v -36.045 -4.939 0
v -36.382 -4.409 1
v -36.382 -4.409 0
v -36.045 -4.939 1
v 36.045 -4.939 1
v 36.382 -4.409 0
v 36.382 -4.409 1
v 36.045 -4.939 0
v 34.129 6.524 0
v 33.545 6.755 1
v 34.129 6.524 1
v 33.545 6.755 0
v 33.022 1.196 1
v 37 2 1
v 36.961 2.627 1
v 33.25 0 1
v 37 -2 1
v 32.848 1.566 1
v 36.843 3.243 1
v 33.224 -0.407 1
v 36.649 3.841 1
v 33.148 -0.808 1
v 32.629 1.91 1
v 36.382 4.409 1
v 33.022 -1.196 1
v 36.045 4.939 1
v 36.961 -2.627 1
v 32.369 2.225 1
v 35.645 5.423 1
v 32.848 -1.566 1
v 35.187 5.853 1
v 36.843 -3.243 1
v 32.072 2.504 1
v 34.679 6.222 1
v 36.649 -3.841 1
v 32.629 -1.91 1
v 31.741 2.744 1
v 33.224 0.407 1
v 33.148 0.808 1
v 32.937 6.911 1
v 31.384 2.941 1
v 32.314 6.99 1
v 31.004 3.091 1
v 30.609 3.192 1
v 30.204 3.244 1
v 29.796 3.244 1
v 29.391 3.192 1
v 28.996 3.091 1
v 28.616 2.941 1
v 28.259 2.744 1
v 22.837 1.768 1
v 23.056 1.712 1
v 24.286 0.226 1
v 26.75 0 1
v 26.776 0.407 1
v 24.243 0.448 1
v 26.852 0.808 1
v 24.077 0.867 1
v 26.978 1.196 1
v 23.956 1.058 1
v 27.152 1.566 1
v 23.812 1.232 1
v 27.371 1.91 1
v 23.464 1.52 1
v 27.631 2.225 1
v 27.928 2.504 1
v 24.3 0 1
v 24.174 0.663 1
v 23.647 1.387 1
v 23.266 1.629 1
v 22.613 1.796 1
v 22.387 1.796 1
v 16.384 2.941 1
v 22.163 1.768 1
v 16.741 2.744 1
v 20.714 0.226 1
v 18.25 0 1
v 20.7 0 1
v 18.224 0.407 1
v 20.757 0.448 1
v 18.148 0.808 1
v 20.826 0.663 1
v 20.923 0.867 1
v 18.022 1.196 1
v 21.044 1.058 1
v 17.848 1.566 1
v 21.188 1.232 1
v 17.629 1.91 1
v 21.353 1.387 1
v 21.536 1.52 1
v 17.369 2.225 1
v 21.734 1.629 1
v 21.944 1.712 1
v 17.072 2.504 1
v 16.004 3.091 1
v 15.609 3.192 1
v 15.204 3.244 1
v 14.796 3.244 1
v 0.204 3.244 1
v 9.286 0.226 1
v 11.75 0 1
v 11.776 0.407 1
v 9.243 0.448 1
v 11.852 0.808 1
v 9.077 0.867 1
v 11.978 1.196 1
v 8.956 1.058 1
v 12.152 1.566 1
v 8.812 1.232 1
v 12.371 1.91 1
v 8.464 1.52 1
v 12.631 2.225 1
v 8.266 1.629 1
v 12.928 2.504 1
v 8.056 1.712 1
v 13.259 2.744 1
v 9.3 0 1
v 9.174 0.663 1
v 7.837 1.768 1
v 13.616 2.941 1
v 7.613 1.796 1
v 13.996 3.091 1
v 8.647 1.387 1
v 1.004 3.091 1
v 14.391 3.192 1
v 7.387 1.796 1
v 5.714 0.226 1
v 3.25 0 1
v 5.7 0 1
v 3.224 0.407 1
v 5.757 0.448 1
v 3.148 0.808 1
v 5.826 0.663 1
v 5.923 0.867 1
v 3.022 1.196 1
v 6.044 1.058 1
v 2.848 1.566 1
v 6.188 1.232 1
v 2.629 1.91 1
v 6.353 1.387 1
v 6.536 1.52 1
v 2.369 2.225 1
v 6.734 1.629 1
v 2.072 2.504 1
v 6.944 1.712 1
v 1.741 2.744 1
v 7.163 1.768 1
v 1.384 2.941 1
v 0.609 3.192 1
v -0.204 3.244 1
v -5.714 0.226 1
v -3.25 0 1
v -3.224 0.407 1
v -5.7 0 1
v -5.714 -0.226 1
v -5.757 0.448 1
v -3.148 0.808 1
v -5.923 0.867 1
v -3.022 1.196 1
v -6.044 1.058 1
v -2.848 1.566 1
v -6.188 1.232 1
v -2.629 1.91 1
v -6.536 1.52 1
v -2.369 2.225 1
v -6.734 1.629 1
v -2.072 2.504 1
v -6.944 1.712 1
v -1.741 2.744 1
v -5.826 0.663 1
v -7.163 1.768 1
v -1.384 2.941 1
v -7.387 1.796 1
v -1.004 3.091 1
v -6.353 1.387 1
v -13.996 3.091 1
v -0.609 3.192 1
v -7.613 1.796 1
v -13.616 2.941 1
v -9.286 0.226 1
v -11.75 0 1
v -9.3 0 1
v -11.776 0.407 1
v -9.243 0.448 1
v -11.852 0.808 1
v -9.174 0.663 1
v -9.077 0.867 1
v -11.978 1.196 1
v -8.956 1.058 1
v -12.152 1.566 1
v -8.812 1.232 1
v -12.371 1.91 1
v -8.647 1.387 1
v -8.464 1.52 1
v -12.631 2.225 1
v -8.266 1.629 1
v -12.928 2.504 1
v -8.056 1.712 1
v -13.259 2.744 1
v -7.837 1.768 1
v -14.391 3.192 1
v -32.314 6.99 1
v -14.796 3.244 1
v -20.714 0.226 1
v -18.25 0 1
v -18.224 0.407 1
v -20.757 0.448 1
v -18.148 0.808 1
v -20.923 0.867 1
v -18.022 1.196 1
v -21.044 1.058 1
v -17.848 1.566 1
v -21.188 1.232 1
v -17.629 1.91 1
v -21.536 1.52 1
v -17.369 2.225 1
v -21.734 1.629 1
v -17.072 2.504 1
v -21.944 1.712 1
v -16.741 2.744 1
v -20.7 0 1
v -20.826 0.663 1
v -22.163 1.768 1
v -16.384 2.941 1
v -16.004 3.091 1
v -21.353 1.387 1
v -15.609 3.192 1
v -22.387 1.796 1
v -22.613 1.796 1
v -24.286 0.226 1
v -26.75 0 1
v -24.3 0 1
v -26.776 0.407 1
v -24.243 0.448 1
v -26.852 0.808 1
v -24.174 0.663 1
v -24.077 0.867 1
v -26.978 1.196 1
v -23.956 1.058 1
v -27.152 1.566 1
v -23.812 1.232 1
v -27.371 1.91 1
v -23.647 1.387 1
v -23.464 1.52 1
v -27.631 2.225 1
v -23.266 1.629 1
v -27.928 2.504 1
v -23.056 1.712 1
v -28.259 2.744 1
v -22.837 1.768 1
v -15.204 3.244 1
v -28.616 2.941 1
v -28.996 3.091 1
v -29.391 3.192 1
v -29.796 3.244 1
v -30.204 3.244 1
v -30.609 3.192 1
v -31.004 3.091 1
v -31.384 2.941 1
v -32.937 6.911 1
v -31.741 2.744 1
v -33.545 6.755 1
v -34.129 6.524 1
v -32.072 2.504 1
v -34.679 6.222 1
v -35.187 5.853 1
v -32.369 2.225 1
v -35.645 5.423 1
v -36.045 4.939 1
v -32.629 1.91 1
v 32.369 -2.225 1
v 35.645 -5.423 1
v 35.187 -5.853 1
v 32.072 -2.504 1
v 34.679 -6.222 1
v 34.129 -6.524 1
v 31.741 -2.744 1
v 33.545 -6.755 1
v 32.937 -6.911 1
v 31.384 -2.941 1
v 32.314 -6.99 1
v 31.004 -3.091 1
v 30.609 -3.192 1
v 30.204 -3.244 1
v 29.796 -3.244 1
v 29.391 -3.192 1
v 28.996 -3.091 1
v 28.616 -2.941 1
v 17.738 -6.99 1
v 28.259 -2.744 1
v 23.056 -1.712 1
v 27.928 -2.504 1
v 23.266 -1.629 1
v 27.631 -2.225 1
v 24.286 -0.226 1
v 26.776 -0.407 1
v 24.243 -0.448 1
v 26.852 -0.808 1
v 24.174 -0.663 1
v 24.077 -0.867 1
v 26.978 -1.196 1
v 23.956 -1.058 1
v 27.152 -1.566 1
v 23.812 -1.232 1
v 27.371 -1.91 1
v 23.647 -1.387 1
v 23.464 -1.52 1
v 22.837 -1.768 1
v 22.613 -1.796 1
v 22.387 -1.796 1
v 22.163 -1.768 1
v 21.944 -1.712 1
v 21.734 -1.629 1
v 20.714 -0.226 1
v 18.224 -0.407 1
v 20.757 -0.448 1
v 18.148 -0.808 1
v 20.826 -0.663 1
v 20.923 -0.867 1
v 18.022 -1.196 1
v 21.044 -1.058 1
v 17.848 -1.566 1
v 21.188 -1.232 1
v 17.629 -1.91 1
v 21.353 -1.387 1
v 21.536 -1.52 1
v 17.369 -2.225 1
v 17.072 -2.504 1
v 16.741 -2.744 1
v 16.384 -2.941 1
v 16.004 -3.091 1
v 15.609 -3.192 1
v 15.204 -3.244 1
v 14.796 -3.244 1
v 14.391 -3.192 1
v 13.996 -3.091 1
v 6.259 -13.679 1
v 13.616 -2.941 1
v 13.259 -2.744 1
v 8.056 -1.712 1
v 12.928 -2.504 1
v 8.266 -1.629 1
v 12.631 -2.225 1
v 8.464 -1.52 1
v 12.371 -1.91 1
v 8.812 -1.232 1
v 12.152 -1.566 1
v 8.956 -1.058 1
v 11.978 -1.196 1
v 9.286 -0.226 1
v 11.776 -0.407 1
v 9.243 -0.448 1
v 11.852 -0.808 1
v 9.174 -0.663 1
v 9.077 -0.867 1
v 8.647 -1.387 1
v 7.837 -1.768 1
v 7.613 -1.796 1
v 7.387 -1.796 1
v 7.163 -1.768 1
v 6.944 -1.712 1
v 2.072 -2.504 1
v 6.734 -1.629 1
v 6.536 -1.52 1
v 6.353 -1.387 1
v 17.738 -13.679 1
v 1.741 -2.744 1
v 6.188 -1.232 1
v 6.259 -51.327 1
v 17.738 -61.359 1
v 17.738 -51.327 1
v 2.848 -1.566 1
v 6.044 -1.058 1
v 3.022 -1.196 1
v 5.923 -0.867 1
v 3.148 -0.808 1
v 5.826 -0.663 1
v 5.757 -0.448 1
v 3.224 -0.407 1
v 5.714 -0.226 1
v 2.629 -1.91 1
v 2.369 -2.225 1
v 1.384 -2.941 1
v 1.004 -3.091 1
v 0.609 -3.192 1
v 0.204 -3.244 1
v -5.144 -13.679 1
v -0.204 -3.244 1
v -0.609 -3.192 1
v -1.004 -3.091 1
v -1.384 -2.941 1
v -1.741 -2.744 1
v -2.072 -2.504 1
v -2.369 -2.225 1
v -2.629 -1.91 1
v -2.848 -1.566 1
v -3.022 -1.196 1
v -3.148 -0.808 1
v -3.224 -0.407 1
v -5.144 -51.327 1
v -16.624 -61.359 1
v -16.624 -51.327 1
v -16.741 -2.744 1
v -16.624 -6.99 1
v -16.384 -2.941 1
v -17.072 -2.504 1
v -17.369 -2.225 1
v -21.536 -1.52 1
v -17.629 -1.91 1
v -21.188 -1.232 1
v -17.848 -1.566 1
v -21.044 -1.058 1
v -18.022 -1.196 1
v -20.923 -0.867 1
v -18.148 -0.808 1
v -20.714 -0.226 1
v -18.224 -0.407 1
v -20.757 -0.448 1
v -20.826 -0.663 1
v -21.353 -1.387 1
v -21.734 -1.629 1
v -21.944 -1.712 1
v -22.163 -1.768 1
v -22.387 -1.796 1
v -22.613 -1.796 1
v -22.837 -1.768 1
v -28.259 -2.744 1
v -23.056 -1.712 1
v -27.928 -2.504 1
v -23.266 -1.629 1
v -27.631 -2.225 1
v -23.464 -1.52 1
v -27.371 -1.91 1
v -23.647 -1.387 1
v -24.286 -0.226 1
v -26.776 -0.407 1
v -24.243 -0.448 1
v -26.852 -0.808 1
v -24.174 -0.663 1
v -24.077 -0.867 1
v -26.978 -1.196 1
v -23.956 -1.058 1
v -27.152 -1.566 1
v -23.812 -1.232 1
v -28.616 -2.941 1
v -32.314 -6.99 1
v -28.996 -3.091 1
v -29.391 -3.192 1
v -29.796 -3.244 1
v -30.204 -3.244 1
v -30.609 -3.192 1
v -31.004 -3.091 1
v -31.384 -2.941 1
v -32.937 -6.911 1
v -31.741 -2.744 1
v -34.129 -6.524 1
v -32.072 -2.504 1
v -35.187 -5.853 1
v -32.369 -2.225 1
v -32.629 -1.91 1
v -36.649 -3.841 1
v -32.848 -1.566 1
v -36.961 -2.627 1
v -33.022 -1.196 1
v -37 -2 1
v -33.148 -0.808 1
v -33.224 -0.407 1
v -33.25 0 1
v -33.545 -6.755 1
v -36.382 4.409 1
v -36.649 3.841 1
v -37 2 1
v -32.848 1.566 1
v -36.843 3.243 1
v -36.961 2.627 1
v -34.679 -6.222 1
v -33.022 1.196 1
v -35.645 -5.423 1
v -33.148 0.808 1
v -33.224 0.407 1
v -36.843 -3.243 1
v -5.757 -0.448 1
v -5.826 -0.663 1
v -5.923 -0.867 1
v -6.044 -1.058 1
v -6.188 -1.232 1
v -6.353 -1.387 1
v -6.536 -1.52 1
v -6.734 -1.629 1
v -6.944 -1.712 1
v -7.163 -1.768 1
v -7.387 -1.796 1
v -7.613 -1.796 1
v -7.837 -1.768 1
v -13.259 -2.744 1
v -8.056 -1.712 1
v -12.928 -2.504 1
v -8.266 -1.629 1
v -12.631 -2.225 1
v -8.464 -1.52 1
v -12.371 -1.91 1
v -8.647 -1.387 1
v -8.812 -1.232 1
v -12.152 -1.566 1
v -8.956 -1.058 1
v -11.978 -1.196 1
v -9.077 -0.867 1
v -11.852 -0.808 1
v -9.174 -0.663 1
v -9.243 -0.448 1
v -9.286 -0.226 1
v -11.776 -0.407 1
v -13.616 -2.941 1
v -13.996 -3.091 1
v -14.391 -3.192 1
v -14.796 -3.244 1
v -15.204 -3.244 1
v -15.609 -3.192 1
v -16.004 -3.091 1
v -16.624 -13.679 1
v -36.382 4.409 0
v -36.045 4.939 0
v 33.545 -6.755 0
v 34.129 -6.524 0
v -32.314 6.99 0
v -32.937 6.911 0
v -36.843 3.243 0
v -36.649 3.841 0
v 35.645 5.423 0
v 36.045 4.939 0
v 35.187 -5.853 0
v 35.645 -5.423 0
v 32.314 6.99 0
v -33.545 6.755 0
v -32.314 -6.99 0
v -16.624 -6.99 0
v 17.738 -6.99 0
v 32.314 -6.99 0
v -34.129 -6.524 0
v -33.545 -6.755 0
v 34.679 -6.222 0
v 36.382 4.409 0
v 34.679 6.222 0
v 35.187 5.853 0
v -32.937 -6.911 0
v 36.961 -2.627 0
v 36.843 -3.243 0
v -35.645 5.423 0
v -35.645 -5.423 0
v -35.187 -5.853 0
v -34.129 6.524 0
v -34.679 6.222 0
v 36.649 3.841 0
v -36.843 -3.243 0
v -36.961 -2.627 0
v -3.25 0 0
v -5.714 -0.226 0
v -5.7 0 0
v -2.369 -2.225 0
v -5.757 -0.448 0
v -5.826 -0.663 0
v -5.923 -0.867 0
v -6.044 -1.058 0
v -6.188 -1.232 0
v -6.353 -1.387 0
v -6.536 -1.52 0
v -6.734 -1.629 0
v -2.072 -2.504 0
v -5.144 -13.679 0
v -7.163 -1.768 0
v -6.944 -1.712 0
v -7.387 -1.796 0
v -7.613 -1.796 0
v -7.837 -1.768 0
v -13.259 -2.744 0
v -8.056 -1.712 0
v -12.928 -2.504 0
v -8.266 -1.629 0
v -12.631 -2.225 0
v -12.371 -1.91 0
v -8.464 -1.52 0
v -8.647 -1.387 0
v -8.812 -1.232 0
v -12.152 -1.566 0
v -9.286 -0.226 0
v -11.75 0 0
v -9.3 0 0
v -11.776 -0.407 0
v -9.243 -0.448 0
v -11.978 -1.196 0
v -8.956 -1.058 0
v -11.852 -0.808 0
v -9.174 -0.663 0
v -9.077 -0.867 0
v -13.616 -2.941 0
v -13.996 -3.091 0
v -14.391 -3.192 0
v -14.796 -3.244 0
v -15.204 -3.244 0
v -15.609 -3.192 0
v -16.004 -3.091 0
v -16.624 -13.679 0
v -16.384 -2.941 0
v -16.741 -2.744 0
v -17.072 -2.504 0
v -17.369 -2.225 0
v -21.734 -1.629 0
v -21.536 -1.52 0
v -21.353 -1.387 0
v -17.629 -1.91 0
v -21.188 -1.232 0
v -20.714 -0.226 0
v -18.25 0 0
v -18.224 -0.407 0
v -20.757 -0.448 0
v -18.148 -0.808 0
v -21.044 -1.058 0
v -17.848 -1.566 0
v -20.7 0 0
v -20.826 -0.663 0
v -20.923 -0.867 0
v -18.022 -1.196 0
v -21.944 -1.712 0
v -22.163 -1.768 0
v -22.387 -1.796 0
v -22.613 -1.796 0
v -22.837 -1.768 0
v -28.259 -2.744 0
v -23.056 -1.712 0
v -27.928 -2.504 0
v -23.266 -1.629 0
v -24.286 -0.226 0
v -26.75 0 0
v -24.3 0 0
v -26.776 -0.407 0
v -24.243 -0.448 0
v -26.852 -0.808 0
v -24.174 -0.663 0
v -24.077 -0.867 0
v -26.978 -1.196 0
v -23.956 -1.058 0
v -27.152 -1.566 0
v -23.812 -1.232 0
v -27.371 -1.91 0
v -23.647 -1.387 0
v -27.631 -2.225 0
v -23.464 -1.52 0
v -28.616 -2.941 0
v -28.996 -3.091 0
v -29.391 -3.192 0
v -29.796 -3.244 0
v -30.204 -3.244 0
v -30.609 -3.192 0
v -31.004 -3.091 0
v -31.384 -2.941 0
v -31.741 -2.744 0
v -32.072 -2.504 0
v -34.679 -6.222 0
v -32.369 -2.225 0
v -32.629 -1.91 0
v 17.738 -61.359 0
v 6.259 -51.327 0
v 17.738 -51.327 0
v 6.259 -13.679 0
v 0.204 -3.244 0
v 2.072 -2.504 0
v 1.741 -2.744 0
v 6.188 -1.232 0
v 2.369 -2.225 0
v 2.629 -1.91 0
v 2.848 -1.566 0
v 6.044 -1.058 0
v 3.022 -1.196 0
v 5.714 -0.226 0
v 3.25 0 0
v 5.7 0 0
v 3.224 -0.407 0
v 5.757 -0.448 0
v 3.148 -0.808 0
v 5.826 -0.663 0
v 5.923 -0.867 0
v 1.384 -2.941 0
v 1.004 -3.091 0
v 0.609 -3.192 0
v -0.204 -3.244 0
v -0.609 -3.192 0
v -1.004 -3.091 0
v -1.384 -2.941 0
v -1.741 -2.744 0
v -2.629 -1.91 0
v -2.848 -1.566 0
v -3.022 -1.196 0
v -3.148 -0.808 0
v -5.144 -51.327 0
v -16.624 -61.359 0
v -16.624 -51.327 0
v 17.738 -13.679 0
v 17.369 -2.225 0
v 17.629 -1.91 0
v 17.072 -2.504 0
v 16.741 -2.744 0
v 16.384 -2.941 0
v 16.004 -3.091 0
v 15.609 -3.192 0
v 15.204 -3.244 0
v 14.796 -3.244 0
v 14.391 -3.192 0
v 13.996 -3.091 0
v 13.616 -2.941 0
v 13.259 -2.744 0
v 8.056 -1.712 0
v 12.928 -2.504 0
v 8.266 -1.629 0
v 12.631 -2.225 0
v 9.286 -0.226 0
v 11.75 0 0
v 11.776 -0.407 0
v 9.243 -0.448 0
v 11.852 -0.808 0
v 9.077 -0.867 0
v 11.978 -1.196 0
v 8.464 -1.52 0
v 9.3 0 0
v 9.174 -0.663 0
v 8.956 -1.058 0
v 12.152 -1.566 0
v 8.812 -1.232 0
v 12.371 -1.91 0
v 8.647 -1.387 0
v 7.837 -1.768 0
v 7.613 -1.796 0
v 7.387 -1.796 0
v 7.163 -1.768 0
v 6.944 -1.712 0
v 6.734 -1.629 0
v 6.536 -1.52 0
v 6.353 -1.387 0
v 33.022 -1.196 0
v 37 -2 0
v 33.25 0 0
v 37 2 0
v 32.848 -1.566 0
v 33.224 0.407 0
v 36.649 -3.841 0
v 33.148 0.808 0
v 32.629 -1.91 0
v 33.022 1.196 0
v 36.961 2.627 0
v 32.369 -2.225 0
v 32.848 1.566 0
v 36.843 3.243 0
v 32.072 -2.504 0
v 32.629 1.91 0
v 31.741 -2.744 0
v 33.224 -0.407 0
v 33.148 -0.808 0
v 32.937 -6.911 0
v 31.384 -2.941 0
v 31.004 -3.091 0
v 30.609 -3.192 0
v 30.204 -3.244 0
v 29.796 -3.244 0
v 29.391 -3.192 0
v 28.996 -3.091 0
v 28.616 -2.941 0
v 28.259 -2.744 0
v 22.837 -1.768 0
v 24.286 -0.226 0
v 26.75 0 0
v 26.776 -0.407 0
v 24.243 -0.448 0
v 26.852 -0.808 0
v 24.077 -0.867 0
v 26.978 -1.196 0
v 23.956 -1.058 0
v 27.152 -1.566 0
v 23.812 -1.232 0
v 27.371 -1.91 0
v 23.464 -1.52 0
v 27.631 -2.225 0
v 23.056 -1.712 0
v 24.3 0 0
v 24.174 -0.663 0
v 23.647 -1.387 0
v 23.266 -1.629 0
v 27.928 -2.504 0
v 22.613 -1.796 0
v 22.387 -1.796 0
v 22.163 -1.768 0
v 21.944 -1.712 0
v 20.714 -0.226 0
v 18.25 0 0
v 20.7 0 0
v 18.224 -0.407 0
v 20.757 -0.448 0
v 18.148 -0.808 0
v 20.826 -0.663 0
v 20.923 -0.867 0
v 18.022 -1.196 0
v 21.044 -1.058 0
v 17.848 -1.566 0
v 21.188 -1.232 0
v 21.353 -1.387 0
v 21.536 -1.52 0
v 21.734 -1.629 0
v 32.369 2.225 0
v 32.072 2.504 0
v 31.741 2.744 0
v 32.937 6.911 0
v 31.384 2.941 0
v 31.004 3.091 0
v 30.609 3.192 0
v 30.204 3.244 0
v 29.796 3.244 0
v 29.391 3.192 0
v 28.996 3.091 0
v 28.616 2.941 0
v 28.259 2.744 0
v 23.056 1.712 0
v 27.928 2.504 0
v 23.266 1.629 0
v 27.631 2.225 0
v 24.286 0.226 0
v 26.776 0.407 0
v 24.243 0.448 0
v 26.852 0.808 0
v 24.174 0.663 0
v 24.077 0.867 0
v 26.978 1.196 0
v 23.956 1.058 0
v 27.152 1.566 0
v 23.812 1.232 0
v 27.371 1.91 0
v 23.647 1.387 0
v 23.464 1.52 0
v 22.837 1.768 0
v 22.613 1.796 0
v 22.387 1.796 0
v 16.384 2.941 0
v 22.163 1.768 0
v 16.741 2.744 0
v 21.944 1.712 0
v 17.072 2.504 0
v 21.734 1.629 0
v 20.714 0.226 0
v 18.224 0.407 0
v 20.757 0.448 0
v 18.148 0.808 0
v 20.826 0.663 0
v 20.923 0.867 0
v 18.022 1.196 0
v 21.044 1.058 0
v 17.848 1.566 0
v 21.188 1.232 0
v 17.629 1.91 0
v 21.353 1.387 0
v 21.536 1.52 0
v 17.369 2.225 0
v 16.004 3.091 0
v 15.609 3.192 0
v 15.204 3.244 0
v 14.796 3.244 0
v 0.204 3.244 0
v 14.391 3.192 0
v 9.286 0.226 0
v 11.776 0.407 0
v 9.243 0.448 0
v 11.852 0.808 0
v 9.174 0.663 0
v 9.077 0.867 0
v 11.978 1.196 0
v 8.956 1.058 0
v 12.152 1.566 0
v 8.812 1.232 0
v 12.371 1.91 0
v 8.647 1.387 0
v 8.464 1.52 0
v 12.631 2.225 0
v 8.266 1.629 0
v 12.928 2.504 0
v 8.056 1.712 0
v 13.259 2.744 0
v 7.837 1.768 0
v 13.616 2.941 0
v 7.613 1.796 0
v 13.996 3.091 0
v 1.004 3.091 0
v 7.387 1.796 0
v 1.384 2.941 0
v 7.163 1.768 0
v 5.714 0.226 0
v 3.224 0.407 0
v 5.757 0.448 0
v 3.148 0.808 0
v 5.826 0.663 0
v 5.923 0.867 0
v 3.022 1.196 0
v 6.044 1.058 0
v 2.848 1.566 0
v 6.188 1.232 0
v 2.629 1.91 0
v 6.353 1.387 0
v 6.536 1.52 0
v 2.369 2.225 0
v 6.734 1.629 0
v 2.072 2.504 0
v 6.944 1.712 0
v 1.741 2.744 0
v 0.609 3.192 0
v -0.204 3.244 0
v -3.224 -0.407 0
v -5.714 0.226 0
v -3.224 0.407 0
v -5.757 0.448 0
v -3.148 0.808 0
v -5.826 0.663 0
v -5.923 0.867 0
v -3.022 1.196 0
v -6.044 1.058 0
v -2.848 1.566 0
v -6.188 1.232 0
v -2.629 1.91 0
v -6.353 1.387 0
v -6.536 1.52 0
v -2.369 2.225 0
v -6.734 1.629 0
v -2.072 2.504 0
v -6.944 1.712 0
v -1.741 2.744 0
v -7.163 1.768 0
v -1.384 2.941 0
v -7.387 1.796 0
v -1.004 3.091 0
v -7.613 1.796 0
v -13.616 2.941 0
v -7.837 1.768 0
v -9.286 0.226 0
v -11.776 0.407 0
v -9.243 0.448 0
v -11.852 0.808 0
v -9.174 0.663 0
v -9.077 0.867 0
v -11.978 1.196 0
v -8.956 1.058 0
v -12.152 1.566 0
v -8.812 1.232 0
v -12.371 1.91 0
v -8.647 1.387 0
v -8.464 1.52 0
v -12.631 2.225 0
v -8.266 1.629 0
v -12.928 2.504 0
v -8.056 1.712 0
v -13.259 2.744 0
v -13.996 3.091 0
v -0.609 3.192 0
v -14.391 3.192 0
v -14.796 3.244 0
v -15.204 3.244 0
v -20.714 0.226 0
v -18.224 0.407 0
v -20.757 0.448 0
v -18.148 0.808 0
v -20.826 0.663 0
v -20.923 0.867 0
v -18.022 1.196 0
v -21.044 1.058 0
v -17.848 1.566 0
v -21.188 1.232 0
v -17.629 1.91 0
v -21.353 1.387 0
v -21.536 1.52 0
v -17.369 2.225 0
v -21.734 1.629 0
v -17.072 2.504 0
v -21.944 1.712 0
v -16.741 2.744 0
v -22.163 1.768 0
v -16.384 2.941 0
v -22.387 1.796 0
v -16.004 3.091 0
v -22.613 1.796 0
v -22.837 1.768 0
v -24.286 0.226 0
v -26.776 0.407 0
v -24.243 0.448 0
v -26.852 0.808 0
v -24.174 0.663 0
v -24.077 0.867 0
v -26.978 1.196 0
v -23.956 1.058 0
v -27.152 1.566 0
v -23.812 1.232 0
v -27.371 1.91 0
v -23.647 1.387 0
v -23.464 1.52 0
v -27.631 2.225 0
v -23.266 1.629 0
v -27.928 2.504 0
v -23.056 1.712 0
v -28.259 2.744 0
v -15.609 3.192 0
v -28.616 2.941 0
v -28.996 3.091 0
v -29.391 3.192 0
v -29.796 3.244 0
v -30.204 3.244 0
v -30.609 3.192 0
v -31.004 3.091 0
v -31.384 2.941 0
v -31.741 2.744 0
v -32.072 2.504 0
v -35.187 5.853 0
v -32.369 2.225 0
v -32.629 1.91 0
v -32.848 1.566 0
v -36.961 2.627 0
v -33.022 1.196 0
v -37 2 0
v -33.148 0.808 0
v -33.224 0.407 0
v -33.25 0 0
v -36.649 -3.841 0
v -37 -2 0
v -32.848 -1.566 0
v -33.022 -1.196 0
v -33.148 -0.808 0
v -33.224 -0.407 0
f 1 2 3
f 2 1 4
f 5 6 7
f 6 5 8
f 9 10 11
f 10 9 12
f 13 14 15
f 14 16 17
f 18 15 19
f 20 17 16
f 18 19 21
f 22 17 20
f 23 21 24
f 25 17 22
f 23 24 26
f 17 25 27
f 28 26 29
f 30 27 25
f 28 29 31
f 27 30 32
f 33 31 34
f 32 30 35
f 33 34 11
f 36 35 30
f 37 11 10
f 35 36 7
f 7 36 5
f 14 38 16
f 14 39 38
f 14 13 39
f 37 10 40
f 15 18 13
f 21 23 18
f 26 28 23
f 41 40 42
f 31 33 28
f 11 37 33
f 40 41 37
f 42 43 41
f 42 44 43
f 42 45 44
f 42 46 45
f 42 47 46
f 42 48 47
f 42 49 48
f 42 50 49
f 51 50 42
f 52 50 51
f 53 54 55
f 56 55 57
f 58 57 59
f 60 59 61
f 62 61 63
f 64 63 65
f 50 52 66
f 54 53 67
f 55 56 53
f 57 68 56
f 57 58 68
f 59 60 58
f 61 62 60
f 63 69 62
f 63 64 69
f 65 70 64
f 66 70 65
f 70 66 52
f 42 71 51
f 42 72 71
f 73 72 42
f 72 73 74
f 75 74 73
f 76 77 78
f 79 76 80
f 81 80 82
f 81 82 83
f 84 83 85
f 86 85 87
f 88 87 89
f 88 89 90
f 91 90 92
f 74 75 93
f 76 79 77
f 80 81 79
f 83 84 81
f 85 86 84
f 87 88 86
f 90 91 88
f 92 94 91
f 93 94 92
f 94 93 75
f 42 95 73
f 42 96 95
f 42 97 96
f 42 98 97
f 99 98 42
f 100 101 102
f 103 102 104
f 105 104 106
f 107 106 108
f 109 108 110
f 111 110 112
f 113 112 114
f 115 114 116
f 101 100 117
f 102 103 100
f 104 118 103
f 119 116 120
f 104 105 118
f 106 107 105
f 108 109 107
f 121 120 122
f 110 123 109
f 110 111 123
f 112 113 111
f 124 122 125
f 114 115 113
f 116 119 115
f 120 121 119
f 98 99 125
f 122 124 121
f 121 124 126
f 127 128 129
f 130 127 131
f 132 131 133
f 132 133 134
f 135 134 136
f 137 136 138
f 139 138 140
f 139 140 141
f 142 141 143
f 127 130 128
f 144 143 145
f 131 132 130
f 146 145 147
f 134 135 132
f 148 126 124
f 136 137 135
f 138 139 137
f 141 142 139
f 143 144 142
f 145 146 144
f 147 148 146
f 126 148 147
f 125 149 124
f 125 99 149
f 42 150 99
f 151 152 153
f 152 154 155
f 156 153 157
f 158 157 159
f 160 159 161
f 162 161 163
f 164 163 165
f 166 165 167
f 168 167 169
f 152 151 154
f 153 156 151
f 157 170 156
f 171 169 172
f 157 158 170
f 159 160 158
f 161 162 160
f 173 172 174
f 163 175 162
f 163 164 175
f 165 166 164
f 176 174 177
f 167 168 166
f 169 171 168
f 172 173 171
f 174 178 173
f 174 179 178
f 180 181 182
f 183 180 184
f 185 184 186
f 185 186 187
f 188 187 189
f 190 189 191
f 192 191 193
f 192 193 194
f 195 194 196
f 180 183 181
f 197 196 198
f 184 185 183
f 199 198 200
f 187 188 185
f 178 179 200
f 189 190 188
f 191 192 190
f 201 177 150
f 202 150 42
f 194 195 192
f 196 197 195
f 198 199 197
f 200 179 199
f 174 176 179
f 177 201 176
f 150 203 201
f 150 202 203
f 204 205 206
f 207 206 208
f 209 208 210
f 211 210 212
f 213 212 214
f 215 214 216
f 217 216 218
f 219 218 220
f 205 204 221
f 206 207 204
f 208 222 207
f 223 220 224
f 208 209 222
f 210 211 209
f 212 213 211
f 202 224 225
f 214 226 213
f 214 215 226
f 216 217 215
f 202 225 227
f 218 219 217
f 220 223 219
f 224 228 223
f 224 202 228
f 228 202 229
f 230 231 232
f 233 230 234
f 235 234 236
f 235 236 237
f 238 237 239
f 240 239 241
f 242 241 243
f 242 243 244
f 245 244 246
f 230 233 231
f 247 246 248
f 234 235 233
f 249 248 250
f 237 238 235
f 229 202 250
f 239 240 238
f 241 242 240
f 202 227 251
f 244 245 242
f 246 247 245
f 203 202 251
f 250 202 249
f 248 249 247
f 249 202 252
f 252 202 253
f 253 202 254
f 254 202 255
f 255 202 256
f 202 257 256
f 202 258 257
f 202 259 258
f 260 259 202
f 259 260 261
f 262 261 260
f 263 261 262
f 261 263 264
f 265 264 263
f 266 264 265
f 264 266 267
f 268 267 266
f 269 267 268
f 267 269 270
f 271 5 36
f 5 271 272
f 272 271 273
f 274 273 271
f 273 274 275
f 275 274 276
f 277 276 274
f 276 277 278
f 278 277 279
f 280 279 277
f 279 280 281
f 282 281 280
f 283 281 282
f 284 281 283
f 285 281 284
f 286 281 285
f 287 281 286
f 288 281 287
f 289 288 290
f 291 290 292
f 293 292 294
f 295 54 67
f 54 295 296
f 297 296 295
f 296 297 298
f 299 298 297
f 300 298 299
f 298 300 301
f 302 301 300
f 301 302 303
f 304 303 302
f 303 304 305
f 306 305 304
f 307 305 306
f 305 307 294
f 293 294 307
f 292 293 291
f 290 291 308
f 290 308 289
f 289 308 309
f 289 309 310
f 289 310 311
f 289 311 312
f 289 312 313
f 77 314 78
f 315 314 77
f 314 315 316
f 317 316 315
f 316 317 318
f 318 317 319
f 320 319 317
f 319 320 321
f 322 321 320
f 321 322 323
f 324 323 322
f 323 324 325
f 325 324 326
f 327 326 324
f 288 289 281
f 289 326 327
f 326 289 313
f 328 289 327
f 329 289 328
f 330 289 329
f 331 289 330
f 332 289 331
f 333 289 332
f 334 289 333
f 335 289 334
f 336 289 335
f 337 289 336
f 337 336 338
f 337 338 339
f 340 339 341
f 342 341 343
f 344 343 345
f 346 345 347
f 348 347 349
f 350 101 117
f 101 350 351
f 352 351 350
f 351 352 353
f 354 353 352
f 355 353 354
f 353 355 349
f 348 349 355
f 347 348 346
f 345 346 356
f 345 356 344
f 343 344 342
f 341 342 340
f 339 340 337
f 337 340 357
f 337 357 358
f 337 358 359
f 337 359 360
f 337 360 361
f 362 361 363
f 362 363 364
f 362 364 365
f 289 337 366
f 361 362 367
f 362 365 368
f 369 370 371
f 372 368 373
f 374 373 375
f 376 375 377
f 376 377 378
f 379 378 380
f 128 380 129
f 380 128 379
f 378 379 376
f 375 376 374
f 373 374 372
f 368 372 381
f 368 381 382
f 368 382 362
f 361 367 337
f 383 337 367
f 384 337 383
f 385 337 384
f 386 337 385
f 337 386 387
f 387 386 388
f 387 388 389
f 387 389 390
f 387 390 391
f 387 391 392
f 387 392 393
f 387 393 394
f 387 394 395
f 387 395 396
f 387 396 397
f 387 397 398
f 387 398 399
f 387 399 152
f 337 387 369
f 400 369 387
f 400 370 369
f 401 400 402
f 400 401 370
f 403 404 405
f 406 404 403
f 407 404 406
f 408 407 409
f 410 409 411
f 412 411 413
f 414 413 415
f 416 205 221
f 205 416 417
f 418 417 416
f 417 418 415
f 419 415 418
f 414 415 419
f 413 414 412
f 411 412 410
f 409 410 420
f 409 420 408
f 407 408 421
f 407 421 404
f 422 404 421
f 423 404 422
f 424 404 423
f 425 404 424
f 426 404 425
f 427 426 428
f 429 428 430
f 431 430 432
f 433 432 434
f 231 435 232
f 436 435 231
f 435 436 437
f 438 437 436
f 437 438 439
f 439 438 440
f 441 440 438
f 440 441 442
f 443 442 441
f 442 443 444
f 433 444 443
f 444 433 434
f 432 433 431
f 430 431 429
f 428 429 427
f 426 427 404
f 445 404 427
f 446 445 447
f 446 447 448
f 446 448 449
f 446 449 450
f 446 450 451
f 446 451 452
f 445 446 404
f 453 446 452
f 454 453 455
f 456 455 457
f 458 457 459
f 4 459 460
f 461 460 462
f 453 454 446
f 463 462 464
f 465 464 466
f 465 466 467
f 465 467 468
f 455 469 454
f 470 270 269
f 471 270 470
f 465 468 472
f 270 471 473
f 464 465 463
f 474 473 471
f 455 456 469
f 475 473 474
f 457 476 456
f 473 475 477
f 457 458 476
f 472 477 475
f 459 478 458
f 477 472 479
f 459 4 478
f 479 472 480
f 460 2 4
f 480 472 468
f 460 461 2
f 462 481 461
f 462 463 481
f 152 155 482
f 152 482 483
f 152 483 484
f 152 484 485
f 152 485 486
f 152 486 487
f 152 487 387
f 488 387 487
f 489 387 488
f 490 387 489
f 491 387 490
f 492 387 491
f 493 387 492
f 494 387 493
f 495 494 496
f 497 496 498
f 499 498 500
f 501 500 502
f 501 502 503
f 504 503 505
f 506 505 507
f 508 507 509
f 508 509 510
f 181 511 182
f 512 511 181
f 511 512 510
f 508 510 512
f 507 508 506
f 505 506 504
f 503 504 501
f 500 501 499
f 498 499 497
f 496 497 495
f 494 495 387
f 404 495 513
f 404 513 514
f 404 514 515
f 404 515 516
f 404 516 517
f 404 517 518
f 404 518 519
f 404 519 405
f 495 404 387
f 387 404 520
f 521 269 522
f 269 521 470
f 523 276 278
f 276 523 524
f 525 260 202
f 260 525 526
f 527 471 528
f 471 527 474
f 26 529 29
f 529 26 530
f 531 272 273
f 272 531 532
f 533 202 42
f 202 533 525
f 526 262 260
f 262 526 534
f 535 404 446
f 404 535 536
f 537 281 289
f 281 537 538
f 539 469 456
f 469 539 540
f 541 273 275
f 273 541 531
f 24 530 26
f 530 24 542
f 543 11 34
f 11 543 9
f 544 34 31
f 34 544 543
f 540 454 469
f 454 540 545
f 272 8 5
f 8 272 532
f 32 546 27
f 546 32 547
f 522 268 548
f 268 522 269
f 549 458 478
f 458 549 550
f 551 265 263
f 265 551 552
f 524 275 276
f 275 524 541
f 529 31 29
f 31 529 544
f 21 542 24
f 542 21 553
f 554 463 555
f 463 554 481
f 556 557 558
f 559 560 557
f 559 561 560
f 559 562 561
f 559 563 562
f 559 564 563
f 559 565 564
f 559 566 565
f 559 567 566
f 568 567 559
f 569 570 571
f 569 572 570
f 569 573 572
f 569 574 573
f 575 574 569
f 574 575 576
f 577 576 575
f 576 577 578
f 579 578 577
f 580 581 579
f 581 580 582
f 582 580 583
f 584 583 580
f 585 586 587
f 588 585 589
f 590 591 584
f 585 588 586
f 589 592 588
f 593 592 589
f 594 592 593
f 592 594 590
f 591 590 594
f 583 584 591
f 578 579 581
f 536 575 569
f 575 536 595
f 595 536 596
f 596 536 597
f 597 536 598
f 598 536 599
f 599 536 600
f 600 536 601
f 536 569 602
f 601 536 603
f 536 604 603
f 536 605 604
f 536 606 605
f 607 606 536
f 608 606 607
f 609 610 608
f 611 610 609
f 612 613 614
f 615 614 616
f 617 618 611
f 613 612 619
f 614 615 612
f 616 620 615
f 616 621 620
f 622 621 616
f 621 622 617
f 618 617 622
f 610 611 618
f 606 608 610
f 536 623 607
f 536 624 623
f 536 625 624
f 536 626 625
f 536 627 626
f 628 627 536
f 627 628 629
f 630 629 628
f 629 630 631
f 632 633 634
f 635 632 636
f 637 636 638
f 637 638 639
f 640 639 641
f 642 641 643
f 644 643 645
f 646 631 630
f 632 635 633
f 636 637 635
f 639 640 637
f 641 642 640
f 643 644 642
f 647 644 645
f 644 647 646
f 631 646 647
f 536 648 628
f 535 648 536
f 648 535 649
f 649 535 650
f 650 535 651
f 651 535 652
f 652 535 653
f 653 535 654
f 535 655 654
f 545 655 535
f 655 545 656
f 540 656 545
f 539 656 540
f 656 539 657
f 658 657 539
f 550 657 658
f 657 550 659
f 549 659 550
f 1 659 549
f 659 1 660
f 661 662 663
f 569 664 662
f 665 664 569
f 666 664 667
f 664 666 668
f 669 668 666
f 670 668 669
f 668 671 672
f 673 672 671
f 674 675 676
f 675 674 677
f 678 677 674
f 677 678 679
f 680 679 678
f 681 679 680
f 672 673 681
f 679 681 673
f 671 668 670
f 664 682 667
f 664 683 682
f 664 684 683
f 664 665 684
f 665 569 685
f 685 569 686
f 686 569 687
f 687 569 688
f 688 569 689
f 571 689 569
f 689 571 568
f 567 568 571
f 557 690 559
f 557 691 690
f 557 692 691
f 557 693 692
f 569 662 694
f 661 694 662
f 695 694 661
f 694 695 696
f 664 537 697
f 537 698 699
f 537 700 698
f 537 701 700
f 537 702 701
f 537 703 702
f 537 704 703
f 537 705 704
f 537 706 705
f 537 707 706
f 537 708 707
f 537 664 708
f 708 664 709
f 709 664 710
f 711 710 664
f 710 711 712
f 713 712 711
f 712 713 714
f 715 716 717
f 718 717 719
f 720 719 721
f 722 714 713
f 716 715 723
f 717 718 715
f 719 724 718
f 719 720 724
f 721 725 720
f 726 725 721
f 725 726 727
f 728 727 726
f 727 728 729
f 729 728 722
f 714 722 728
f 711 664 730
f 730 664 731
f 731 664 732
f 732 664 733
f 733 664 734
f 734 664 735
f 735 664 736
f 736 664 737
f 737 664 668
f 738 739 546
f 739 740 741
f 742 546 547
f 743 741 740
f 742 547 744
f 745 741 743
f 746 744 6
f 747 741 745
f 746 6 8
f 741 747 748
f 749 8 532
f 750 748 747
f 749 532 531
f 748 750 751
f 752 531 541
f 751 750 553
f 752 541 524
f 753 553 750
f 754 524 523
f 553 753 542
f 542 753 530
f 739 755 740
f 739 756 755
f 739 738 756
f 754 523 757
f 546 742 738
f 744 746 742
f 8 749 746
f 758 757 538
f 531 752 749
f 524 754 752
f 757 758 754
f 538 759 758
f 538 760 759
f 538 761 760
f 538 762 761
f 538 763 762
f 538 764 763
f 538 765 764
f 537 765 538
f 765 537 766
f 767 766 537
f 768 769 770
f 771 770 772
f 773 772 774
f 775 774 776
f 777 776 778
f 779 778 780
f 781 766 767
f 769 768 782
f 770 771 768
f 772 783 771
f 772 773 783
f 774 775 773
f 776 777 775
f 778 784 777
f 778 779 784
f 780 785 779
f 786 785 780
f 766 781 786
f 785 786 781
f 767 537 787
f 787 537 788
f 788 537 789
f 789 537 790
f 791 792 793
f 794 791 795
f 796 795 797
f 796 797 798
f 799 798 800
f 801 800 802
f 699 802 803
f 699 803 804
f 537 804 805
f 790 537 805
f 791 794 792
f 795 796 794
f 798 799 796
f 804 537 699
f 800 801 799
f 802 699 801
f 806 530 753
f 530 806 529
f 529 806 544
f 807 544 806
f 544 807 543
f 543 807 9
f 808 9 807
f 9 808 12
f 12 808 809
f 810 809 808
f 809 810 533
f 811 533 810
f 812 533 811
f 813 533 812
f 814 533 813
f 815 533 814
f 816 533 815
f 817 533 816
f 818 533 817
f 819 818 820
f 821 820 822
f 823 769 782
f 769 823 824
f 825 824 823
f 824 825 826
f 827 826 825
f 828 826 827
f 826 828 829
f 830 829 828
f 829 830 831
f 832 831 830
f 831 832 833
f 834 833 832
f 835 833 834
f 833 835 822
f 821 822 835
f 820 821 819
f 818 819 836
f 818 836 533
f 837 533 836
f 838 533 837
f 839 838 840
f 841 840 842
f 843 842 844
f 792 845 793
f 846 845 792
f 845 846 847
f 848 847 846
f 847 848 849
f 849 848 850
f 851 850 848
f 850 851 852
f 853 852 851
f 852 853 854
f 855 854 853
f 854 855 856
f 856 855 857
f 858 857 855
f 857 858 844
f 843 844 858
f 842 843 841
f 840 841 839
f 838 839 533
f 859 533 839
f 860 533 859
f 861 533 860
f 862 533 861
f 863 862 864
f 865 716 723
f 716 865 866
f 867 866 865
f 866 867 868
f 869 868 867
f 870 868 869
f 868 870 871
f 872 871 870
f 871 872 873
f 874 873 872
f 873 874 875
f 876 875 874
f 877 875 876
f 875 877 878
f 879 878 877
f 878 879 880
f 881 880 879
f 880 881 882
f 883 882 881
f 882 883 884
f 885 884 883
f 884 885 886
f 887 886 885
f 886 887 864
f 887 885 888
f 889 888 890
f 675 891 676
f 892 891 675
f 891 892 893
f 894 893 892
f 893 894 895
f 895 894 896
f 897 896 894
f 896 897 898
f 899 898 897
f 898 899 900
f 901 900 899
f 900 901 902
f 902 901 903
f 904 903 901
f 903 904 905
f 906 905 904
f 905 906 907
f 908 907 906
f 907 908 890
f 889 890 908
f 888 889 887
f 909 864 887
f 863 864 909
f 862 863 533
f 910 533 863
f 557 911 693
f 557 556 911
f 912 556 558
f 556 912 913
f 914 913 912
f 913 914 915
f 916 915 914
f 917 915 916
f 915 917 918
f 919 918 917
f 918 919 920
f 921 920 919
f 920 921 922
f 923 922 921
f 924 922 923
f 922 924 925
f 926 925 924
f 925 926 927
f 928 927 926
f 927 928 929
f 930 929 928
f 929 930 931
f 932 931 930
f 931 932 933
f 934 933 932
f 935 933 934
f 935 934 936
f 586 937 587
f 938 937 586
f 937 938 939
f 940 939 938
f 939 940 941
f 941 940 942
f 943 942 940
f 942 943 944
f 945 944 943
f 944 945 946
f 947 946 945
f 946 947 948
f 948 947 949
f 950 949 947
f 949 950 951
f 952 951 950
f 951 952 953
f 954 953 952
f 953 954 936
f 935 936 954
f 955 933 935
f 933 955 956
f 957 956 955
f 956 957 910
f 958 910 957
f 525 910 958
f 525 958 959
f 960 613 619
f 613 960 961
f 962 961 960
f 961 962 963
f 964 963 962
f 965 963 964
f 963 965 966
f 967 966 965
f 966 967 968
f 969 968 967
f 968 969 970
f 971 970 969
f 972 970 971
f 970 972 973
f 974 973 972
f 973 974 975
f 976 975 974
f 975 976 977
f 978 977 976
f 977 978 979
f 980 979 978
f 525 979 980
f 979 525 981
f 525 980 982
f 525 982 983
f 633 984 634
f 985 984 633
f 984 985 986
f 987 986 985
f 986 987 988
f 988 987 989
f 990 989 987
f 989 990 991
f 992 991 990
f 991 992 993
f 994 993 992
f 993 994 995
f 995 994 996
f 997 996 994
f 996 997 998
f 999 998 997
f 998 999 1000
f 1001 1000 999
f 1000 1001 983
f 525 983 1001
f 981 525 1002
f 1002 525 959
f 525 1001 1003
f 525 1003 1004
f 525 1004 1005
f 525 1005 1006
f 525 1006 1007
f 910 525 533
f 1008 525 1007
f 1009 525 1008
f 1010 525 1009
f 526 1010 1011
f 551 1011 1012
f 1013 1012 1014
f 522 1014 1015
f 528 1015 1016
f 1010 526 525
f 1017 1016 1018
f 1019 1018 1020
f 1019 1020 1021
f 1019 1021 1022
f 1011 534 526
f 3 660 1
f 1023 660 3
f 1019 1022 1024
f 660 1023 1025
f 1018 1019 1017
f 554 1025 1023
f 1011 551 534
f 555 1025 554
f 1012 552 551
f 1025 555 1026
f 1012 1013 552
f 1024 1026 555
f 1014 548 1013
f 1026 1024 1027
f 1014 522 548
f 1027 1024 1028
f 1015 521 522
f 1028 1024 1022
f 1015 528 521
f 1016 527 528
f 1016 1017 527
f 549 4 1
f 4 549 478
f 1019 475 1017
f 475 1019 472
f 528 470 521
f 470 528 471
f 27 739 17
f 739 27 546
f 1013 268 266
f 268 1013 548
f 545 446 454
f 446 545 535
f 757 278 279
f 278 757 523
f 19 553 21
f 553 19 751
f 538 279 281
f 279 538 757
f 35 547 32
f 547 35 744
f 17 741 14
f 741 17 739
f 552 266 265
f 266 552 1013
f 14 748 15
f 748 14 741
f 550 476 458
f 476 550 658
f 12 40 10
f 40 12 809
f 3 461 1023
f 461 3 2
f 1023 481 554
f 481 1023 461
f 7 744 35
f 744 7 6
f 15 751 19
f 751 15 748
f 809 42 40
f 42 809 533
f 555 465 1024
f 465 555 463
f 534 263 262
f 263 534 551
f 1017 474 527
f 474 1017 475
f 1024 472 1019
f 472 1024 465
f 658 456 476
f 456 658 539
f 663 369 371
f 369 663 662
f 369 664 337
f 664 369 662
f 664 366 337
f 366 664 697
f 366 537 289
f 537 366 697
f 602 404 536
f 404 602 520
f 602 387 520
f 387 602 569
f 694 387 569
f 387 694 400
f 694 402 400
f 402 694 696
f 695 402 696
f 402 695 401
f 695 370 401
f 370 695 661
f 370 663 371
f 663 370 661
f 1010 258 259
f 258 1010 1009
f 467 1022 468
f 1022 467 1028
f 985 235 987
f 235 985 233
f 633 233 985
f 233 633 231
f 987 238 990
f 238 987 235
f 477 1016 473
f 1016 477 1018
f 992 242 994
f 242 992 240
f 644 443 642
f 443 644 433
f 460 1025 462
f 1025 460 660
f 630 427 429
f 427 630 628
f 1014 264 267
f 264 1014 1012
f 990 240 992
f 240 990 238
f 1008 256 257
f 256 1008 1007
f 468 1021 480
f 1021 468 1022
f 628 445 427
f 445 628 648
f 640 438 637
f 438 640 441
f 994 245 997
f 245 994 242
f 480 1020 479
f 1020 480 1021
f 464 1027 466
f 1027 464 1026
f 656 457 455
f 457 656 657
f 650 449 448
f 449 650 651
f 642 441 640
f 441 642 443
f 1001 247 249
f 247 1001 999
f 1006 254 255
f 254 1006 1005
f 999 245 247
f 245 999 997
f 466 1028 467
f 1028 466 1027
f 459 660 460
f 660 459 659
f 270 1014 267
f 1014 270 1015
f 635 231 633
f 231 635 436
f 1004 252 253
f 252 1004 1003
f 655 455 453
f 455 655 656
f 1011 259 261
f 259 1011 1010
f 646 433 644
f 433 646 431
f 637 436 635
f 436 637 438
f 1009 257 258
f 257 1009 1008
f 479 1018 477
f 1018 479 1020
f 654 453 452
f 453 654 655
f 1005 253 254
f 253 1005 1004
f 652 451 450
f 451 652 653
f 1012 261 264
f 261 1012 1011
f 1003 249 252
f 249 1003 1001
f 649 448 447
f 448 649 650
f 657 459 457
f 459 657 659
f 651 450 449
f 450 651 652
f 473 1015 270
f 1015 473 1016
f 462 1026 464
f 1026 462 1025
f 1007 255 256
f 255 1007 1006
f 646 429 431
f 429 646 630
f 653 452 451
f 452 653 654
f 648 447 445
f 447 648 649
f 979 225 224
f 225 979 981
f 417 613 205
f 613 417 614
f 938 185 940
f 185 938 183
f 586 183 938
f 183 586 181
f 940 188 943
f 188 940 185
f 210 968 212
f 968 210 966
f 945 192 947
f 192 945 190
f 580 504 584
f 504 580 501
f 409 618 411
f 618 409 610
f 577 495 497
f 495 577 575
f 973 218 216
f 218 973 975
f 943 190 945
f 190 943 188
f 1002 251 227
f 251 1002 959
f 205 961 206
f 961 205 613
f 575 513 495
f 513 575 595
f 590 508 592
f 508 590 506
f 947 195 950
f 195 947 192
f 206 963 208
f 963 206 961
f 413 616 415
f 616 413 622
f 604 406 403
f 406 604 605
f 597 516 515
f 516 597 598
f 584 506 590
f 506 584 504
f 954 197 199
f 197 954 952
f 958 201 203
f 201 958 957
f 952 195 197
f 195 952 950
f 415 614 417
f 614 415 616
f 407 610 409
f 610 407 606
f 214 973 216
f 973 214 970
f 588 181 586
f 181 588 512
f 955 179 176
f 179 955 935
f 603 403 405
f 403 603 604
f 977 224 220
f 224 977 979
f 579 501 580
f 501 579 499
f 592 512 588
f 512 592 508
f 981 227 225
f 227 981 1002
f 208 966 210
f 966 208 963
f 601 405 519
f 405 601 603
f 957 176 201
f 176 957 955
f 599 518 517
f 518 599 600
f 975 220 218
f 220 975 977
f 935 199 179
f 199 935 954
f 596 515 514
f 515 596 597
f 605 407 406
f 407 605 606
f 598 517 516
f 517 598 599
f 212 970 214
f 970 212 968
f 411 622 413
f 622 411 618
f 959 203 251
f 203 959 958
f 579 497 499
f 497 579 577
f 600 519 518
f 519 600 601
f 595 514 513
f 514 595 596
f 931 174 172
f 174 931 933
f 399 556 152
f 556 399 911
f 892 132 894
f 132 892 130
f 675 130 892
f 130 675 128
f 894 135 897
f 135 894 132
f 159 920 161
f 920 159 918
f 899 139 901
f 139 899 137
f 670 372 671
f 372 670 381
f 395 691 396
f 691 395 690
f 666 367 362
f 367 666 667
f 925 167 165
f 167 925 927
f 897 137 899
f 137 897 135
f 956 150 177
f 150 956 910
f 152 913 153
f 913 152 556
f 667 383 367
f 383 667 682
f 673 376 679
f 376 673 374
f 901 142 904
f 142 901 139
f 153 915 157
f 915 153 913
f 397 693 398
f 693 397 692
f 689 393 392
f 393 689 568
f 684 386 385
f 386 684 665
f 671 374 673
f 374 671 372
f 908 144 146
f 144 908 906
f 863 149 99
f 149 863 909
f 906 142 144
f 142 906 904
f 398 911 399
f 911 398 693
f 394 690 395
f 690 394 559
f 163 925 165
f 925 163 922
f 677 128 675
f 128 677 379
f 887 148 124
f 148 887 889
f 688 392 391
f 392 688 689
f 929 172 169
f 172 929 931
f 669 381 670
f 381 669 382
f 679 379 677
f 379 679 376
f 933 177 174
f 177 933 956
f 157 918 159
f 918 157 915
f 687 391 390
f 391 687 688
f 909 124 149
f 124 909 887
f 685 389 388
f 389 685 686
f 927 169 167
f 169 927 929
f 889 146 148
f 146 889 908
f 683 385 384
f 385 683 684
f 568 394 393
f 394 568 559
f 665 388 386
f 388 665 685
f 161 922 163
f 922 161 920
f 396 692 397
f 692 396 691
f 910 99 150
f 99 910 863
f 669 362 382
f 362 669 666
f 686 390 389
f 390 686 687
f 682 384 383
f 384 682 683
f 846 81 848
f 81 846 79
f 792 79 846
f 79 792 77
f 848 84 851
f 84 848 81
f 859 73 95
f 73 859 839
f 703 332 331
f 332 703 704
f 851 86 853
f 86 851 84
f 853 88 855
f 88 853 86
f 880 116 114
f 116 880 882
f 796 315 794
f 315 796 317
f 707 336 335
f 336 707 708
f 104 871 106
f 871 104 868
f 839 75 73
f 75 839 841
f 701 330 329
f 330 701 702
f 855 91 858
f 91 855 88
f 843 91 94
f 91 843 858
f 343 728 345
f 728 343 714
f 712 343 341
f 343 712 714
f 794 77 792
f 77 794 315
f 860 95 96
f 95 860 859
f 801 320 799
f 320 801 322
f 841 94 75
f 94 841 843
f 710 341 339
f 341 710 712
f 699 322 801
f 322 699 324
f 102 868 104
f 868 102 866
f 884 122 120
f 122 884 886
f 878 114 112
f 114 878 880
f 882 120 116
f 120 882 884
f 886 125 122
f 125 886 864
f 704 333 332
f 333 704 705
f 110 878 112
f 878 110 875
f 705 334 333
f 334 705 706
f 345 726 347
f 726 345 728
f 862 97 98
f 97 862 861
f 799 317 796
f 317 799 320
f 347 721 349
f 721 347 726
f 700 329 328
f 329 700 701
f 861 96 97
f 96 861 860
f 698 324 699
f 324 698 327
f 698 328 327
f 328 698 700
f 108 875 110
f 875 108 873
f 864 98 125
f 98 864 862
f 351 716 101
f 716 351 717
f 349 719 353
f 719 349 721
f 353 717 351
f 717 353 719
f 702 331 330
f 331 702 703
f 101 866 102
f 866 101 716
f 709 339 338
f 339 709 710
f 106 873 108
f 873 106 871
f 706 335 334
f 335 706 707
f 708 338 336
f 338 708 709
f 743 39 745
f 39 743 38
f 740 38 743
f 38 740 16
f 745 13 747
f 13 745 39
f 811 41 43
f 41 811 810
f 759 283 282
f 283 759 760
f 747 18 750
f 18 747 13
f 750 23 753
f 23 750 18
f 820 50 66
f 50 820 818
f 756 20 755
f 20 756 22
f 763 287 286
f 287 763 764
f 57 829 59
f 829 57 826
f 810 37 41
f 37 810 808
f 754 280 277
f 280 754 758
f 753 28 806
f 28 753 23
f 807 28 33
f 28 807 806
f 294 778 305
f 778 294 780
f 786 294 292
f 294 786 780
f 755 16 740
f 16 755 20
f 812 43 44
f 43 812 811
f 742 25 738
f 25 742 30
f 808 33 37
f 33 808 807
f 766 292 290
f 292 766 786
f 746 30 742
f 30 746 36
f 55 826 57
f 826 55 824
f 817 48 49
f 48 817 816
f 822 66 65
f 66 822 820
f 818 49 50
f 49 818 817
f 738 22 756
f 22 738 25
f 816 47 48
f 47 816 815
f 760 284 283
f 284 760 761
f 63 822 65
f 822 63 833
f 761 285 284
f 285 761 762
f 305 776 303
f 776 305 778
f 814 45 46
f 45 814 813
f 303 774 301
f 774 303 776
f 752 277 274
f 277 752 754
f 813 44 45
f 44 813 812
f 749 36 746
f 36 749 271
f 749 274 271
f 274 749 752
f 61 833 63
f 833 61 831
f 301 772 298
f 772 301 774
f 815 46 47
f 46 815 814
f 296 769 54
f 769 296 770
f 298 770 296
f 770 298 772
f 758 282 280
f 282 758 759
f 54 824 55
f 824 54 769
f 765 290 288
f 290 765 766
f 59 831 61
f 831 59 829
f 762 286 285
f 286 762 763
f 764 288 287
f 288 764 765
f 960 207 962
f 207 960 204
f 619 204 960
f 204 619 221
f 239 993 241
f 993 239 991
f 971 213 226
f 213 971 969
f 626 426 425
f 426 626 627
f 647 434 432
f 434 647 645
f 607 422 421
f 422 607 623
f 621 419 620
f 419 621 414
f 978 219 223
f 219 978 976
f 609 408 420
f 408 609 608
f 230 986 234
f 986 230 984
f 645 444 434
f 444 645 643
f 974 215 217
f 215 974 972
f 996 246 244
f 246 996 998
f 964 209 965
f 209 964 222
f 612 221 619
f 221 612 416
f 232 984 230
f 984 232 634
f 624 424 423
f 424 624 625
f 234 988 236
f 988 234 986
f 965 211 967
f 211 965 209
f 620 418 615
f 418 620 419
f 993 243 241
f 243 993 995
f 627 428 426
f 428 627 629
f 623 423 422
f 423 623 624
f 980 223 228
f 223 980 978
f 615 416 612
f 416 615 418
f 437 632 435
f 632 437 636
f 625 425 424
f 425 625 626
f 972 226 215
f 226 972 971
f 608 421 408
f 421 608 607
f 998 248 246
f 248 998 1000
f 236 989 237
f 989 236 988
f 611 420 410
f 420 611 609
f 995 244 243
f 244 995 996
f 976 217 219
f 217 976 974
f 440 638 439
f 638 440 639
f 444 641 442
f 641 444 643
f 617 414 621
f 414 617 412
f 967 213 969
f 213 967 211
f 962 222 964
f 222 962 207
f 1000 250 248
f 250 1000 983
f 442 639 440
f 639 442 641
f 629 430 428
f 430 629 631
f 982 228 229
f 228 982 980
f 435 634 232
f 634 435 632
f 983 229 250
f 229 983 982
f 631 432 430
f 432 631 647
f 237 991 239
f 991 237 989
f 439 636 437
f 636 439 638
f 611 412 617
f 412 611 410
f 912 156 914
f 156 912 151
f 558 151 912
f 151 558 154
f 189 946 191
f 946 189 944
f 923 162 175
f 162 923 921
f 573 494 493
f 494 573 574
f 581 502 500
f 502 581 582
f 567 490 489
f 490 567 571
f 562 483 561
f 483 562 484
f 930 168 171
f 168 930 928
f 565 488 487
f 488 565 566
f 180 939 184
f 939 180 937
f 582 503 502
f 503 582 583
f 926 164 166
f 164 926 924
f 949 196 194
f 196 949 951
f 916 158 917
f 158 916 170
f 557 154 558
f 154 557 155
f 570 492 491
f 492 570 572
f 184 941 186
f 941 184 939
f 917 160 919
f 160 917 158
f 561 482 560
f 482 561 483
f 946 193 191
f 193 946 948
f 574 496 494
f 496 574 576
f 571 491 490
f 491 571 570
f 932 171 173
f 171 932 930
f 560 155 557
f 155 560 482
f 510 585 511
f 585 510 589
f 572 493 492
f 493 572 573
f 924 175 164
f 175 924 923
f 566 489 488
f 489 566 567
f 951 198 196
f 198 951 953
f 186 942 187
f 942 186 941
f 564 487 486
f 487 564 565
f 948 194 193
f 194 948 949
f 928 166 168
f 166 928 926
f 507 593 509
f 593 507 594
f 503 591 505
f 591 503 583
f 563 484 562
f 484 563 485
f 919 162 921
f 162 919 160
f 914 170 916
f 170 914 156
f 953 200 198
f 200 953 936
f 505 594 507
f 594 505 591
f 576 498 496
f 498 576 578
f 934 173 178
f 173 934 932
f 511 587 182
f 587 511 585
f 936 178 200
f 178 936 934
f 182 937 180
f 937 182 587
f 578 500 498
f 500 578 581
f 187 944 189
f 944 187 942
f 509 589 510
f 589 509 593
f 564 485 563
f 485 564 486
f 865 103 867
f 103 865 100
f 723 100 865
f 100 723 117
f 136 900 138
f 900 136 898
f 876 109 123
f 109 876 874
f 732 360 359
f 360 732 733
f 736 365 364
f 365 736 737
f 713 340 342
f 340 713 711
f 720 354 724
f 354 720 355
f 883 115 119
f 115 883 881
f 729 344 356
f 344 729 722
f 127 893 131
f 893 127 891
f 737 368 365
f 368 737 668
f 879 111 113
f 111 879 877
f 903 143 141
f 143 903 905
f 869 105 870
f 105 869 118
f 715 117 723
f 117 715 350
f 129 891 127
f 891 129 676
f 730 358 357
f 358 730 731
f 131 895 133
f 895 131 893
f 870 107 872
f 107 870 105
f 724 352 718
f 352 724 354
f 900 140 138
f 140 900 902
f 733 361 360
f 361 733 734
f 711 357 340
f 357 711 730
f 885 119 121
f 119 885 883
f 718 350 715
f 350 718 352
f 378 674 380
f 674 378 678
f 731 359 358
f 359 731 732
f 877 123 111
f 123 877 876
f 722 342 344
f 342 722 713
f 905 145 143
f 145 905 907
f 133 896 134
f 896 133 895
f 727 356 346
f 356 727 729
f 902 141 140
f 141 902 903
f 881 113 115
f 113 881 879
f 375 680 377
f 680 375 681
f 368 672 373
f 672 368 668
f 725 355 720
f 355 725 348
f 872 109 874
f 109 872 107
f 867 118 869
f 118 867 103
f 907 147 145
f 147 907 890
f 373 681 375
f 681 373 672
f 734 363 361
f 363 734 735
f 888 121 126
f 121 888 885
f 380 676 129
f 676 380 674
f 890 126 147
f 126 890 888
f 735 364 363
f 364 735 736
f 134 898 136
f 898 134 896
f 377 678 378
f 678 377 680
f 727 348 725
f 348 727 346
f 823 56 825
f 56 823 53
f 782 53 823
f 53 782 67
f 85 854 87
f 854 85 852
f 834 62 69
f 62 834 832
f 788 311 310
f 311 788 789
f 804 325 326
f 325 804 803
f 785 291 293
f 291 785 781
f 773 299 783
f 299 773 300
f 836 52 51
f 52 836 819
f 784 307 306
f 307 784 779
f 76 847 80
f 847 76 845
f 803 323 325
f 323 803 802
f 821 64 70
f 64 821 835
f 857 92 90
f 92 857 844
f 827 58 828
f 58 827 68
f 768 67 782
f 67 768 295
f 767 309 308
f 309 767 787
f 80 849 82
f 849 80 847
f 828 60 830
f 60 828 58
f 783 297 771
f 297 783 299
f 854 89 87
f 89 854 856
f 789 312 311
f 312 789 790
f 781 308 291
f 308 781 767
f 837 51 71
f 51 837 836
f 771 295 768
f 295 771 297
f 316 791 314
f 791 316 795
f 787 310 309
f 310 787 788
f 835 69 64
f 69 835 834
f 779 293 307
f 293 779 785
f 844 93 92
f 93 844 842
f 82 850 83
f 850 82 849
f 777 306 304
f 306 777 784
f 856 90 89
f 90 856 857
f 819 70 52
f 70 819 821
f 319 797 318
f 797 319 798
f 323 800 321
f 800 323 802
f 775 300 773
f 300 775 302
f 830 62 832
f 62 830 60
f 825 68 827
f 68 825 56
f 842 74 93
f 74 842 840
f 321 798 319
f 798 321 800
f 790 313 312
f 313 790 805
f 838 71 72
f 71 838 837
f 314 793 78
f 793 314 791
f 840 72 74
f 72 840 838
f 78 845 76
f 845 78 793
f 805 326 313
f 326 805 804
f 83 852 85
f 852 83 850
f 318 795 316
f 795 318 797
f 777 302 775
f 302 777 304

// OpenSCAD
$fn = 50;


difference() {
	union() {
		hull() {
			translate(v = [-32.0000000000, 2.0000000000, 0]) {
				cylinder(h = 1, r = 5);
			}
			translate(v = [32.0000000000, 2.0000000000, 0]) {
				cylinder(h = 1, r = 5);
			}
			translate(v = [-32.0000000000, -2.0000000000, 0]) {
				cylinder(h = 1, r = 5);
			}
			translate(v = [32.0000000000, -2.0000000000, 0]) {
				cylinder(h = 1, r = 5);
			}
		}
		translate(v = [0, -5, 0]) {
			linear_extrude(height = 1) {
				text(font = "DejaVu Sans Mono:style=Bold", halign = "center", size = 57.0000000000, text = "I", valign = "top");
			}
		}
	}
	union() {
		translate(v = [-30.0000000000, 0.0000000000, 0]) {
			translate(v = [0, 0, -100]) {
				cylinder(h = 200, r = 3.2500000000);
			}
		}
		translate(v = [-15.0000000000, 0.0000000000, 0]) {
			translate(v = [0, 0, -100]) {
				cylinder(h = 200, r = 3.2500000000);
			}
		}
		translate(v = [0, 0, -100]) {
			cylinder(h = 200, r = 3.2500000000);
		}
		translate(v = [15.0000000000, 0.0000000000, 0]) {
			translate(v = [0, 0, -100]) {
				cylinder(h = 200, r = 3.2500000000);
			}
		}
		translate(v = [30.0000000000, 0.0000000000, 0]) {
			translate(v = [0, 0, -100]) {
				cylinder(h = 200, r = 3.2500000000);
			}
		}
		translate(v = [-30.0000000000, 0.0000000000, 0]) {
			translate(v = [0, 0, -100]) {
				cylinder(h = 200, r = 1.8000000000);
			}
		}
		translate(v = [-22.5000000000, 0.0000000000, 0]) {
			translate(v = [0, 0, -100]) {
				cylinder(h = 200, r = 1.8000000000);
			}
		}
		translate(v = [-15.0000000000, 0.0000000000, 0]) {
			translate(v = [0, 0, -100]) {
				cylinder(h = 200, r = 1.8000000000);
			}
		}
		translate(v = [-7.5000000000, 0.0000000000, 0]) {
			translate(v = [0, 0, -100]) {
				cylinder(h = 200, r = 1.8000000000);
			}
		}
		translate(v = [0, 0, -100]) {
			cylinder(h = 200, r = 1.8000000000);
		}
		translate(v = [7.5000000000, 0.0000000000, 0]) {
			translate(v = [0, 0, -100]) {
				cylinder(h = 200, r = 1.8000000000);
			}
		}
		translate(v = [15.0000000000, 0.0000000000, 0]) {
			translate(v = [0, 0, -100]) {
				cylinder(h = 200, r = 1.8000000000);
			}
		}
		translate(v = [22.5000000000, 0.0000000000, 0]) {
			translate(v = [0, 0, -100]) {
				cylinder(h = 200, r = 1.8000000000);
			}
		}
		translate(v = [30.0000000000, 0.0000000000, 0]) {
			translate(v = [0, 0, -100]) {
				cylinder(h = 200, r = 1.8000000000);
			}
		}
	}
}
